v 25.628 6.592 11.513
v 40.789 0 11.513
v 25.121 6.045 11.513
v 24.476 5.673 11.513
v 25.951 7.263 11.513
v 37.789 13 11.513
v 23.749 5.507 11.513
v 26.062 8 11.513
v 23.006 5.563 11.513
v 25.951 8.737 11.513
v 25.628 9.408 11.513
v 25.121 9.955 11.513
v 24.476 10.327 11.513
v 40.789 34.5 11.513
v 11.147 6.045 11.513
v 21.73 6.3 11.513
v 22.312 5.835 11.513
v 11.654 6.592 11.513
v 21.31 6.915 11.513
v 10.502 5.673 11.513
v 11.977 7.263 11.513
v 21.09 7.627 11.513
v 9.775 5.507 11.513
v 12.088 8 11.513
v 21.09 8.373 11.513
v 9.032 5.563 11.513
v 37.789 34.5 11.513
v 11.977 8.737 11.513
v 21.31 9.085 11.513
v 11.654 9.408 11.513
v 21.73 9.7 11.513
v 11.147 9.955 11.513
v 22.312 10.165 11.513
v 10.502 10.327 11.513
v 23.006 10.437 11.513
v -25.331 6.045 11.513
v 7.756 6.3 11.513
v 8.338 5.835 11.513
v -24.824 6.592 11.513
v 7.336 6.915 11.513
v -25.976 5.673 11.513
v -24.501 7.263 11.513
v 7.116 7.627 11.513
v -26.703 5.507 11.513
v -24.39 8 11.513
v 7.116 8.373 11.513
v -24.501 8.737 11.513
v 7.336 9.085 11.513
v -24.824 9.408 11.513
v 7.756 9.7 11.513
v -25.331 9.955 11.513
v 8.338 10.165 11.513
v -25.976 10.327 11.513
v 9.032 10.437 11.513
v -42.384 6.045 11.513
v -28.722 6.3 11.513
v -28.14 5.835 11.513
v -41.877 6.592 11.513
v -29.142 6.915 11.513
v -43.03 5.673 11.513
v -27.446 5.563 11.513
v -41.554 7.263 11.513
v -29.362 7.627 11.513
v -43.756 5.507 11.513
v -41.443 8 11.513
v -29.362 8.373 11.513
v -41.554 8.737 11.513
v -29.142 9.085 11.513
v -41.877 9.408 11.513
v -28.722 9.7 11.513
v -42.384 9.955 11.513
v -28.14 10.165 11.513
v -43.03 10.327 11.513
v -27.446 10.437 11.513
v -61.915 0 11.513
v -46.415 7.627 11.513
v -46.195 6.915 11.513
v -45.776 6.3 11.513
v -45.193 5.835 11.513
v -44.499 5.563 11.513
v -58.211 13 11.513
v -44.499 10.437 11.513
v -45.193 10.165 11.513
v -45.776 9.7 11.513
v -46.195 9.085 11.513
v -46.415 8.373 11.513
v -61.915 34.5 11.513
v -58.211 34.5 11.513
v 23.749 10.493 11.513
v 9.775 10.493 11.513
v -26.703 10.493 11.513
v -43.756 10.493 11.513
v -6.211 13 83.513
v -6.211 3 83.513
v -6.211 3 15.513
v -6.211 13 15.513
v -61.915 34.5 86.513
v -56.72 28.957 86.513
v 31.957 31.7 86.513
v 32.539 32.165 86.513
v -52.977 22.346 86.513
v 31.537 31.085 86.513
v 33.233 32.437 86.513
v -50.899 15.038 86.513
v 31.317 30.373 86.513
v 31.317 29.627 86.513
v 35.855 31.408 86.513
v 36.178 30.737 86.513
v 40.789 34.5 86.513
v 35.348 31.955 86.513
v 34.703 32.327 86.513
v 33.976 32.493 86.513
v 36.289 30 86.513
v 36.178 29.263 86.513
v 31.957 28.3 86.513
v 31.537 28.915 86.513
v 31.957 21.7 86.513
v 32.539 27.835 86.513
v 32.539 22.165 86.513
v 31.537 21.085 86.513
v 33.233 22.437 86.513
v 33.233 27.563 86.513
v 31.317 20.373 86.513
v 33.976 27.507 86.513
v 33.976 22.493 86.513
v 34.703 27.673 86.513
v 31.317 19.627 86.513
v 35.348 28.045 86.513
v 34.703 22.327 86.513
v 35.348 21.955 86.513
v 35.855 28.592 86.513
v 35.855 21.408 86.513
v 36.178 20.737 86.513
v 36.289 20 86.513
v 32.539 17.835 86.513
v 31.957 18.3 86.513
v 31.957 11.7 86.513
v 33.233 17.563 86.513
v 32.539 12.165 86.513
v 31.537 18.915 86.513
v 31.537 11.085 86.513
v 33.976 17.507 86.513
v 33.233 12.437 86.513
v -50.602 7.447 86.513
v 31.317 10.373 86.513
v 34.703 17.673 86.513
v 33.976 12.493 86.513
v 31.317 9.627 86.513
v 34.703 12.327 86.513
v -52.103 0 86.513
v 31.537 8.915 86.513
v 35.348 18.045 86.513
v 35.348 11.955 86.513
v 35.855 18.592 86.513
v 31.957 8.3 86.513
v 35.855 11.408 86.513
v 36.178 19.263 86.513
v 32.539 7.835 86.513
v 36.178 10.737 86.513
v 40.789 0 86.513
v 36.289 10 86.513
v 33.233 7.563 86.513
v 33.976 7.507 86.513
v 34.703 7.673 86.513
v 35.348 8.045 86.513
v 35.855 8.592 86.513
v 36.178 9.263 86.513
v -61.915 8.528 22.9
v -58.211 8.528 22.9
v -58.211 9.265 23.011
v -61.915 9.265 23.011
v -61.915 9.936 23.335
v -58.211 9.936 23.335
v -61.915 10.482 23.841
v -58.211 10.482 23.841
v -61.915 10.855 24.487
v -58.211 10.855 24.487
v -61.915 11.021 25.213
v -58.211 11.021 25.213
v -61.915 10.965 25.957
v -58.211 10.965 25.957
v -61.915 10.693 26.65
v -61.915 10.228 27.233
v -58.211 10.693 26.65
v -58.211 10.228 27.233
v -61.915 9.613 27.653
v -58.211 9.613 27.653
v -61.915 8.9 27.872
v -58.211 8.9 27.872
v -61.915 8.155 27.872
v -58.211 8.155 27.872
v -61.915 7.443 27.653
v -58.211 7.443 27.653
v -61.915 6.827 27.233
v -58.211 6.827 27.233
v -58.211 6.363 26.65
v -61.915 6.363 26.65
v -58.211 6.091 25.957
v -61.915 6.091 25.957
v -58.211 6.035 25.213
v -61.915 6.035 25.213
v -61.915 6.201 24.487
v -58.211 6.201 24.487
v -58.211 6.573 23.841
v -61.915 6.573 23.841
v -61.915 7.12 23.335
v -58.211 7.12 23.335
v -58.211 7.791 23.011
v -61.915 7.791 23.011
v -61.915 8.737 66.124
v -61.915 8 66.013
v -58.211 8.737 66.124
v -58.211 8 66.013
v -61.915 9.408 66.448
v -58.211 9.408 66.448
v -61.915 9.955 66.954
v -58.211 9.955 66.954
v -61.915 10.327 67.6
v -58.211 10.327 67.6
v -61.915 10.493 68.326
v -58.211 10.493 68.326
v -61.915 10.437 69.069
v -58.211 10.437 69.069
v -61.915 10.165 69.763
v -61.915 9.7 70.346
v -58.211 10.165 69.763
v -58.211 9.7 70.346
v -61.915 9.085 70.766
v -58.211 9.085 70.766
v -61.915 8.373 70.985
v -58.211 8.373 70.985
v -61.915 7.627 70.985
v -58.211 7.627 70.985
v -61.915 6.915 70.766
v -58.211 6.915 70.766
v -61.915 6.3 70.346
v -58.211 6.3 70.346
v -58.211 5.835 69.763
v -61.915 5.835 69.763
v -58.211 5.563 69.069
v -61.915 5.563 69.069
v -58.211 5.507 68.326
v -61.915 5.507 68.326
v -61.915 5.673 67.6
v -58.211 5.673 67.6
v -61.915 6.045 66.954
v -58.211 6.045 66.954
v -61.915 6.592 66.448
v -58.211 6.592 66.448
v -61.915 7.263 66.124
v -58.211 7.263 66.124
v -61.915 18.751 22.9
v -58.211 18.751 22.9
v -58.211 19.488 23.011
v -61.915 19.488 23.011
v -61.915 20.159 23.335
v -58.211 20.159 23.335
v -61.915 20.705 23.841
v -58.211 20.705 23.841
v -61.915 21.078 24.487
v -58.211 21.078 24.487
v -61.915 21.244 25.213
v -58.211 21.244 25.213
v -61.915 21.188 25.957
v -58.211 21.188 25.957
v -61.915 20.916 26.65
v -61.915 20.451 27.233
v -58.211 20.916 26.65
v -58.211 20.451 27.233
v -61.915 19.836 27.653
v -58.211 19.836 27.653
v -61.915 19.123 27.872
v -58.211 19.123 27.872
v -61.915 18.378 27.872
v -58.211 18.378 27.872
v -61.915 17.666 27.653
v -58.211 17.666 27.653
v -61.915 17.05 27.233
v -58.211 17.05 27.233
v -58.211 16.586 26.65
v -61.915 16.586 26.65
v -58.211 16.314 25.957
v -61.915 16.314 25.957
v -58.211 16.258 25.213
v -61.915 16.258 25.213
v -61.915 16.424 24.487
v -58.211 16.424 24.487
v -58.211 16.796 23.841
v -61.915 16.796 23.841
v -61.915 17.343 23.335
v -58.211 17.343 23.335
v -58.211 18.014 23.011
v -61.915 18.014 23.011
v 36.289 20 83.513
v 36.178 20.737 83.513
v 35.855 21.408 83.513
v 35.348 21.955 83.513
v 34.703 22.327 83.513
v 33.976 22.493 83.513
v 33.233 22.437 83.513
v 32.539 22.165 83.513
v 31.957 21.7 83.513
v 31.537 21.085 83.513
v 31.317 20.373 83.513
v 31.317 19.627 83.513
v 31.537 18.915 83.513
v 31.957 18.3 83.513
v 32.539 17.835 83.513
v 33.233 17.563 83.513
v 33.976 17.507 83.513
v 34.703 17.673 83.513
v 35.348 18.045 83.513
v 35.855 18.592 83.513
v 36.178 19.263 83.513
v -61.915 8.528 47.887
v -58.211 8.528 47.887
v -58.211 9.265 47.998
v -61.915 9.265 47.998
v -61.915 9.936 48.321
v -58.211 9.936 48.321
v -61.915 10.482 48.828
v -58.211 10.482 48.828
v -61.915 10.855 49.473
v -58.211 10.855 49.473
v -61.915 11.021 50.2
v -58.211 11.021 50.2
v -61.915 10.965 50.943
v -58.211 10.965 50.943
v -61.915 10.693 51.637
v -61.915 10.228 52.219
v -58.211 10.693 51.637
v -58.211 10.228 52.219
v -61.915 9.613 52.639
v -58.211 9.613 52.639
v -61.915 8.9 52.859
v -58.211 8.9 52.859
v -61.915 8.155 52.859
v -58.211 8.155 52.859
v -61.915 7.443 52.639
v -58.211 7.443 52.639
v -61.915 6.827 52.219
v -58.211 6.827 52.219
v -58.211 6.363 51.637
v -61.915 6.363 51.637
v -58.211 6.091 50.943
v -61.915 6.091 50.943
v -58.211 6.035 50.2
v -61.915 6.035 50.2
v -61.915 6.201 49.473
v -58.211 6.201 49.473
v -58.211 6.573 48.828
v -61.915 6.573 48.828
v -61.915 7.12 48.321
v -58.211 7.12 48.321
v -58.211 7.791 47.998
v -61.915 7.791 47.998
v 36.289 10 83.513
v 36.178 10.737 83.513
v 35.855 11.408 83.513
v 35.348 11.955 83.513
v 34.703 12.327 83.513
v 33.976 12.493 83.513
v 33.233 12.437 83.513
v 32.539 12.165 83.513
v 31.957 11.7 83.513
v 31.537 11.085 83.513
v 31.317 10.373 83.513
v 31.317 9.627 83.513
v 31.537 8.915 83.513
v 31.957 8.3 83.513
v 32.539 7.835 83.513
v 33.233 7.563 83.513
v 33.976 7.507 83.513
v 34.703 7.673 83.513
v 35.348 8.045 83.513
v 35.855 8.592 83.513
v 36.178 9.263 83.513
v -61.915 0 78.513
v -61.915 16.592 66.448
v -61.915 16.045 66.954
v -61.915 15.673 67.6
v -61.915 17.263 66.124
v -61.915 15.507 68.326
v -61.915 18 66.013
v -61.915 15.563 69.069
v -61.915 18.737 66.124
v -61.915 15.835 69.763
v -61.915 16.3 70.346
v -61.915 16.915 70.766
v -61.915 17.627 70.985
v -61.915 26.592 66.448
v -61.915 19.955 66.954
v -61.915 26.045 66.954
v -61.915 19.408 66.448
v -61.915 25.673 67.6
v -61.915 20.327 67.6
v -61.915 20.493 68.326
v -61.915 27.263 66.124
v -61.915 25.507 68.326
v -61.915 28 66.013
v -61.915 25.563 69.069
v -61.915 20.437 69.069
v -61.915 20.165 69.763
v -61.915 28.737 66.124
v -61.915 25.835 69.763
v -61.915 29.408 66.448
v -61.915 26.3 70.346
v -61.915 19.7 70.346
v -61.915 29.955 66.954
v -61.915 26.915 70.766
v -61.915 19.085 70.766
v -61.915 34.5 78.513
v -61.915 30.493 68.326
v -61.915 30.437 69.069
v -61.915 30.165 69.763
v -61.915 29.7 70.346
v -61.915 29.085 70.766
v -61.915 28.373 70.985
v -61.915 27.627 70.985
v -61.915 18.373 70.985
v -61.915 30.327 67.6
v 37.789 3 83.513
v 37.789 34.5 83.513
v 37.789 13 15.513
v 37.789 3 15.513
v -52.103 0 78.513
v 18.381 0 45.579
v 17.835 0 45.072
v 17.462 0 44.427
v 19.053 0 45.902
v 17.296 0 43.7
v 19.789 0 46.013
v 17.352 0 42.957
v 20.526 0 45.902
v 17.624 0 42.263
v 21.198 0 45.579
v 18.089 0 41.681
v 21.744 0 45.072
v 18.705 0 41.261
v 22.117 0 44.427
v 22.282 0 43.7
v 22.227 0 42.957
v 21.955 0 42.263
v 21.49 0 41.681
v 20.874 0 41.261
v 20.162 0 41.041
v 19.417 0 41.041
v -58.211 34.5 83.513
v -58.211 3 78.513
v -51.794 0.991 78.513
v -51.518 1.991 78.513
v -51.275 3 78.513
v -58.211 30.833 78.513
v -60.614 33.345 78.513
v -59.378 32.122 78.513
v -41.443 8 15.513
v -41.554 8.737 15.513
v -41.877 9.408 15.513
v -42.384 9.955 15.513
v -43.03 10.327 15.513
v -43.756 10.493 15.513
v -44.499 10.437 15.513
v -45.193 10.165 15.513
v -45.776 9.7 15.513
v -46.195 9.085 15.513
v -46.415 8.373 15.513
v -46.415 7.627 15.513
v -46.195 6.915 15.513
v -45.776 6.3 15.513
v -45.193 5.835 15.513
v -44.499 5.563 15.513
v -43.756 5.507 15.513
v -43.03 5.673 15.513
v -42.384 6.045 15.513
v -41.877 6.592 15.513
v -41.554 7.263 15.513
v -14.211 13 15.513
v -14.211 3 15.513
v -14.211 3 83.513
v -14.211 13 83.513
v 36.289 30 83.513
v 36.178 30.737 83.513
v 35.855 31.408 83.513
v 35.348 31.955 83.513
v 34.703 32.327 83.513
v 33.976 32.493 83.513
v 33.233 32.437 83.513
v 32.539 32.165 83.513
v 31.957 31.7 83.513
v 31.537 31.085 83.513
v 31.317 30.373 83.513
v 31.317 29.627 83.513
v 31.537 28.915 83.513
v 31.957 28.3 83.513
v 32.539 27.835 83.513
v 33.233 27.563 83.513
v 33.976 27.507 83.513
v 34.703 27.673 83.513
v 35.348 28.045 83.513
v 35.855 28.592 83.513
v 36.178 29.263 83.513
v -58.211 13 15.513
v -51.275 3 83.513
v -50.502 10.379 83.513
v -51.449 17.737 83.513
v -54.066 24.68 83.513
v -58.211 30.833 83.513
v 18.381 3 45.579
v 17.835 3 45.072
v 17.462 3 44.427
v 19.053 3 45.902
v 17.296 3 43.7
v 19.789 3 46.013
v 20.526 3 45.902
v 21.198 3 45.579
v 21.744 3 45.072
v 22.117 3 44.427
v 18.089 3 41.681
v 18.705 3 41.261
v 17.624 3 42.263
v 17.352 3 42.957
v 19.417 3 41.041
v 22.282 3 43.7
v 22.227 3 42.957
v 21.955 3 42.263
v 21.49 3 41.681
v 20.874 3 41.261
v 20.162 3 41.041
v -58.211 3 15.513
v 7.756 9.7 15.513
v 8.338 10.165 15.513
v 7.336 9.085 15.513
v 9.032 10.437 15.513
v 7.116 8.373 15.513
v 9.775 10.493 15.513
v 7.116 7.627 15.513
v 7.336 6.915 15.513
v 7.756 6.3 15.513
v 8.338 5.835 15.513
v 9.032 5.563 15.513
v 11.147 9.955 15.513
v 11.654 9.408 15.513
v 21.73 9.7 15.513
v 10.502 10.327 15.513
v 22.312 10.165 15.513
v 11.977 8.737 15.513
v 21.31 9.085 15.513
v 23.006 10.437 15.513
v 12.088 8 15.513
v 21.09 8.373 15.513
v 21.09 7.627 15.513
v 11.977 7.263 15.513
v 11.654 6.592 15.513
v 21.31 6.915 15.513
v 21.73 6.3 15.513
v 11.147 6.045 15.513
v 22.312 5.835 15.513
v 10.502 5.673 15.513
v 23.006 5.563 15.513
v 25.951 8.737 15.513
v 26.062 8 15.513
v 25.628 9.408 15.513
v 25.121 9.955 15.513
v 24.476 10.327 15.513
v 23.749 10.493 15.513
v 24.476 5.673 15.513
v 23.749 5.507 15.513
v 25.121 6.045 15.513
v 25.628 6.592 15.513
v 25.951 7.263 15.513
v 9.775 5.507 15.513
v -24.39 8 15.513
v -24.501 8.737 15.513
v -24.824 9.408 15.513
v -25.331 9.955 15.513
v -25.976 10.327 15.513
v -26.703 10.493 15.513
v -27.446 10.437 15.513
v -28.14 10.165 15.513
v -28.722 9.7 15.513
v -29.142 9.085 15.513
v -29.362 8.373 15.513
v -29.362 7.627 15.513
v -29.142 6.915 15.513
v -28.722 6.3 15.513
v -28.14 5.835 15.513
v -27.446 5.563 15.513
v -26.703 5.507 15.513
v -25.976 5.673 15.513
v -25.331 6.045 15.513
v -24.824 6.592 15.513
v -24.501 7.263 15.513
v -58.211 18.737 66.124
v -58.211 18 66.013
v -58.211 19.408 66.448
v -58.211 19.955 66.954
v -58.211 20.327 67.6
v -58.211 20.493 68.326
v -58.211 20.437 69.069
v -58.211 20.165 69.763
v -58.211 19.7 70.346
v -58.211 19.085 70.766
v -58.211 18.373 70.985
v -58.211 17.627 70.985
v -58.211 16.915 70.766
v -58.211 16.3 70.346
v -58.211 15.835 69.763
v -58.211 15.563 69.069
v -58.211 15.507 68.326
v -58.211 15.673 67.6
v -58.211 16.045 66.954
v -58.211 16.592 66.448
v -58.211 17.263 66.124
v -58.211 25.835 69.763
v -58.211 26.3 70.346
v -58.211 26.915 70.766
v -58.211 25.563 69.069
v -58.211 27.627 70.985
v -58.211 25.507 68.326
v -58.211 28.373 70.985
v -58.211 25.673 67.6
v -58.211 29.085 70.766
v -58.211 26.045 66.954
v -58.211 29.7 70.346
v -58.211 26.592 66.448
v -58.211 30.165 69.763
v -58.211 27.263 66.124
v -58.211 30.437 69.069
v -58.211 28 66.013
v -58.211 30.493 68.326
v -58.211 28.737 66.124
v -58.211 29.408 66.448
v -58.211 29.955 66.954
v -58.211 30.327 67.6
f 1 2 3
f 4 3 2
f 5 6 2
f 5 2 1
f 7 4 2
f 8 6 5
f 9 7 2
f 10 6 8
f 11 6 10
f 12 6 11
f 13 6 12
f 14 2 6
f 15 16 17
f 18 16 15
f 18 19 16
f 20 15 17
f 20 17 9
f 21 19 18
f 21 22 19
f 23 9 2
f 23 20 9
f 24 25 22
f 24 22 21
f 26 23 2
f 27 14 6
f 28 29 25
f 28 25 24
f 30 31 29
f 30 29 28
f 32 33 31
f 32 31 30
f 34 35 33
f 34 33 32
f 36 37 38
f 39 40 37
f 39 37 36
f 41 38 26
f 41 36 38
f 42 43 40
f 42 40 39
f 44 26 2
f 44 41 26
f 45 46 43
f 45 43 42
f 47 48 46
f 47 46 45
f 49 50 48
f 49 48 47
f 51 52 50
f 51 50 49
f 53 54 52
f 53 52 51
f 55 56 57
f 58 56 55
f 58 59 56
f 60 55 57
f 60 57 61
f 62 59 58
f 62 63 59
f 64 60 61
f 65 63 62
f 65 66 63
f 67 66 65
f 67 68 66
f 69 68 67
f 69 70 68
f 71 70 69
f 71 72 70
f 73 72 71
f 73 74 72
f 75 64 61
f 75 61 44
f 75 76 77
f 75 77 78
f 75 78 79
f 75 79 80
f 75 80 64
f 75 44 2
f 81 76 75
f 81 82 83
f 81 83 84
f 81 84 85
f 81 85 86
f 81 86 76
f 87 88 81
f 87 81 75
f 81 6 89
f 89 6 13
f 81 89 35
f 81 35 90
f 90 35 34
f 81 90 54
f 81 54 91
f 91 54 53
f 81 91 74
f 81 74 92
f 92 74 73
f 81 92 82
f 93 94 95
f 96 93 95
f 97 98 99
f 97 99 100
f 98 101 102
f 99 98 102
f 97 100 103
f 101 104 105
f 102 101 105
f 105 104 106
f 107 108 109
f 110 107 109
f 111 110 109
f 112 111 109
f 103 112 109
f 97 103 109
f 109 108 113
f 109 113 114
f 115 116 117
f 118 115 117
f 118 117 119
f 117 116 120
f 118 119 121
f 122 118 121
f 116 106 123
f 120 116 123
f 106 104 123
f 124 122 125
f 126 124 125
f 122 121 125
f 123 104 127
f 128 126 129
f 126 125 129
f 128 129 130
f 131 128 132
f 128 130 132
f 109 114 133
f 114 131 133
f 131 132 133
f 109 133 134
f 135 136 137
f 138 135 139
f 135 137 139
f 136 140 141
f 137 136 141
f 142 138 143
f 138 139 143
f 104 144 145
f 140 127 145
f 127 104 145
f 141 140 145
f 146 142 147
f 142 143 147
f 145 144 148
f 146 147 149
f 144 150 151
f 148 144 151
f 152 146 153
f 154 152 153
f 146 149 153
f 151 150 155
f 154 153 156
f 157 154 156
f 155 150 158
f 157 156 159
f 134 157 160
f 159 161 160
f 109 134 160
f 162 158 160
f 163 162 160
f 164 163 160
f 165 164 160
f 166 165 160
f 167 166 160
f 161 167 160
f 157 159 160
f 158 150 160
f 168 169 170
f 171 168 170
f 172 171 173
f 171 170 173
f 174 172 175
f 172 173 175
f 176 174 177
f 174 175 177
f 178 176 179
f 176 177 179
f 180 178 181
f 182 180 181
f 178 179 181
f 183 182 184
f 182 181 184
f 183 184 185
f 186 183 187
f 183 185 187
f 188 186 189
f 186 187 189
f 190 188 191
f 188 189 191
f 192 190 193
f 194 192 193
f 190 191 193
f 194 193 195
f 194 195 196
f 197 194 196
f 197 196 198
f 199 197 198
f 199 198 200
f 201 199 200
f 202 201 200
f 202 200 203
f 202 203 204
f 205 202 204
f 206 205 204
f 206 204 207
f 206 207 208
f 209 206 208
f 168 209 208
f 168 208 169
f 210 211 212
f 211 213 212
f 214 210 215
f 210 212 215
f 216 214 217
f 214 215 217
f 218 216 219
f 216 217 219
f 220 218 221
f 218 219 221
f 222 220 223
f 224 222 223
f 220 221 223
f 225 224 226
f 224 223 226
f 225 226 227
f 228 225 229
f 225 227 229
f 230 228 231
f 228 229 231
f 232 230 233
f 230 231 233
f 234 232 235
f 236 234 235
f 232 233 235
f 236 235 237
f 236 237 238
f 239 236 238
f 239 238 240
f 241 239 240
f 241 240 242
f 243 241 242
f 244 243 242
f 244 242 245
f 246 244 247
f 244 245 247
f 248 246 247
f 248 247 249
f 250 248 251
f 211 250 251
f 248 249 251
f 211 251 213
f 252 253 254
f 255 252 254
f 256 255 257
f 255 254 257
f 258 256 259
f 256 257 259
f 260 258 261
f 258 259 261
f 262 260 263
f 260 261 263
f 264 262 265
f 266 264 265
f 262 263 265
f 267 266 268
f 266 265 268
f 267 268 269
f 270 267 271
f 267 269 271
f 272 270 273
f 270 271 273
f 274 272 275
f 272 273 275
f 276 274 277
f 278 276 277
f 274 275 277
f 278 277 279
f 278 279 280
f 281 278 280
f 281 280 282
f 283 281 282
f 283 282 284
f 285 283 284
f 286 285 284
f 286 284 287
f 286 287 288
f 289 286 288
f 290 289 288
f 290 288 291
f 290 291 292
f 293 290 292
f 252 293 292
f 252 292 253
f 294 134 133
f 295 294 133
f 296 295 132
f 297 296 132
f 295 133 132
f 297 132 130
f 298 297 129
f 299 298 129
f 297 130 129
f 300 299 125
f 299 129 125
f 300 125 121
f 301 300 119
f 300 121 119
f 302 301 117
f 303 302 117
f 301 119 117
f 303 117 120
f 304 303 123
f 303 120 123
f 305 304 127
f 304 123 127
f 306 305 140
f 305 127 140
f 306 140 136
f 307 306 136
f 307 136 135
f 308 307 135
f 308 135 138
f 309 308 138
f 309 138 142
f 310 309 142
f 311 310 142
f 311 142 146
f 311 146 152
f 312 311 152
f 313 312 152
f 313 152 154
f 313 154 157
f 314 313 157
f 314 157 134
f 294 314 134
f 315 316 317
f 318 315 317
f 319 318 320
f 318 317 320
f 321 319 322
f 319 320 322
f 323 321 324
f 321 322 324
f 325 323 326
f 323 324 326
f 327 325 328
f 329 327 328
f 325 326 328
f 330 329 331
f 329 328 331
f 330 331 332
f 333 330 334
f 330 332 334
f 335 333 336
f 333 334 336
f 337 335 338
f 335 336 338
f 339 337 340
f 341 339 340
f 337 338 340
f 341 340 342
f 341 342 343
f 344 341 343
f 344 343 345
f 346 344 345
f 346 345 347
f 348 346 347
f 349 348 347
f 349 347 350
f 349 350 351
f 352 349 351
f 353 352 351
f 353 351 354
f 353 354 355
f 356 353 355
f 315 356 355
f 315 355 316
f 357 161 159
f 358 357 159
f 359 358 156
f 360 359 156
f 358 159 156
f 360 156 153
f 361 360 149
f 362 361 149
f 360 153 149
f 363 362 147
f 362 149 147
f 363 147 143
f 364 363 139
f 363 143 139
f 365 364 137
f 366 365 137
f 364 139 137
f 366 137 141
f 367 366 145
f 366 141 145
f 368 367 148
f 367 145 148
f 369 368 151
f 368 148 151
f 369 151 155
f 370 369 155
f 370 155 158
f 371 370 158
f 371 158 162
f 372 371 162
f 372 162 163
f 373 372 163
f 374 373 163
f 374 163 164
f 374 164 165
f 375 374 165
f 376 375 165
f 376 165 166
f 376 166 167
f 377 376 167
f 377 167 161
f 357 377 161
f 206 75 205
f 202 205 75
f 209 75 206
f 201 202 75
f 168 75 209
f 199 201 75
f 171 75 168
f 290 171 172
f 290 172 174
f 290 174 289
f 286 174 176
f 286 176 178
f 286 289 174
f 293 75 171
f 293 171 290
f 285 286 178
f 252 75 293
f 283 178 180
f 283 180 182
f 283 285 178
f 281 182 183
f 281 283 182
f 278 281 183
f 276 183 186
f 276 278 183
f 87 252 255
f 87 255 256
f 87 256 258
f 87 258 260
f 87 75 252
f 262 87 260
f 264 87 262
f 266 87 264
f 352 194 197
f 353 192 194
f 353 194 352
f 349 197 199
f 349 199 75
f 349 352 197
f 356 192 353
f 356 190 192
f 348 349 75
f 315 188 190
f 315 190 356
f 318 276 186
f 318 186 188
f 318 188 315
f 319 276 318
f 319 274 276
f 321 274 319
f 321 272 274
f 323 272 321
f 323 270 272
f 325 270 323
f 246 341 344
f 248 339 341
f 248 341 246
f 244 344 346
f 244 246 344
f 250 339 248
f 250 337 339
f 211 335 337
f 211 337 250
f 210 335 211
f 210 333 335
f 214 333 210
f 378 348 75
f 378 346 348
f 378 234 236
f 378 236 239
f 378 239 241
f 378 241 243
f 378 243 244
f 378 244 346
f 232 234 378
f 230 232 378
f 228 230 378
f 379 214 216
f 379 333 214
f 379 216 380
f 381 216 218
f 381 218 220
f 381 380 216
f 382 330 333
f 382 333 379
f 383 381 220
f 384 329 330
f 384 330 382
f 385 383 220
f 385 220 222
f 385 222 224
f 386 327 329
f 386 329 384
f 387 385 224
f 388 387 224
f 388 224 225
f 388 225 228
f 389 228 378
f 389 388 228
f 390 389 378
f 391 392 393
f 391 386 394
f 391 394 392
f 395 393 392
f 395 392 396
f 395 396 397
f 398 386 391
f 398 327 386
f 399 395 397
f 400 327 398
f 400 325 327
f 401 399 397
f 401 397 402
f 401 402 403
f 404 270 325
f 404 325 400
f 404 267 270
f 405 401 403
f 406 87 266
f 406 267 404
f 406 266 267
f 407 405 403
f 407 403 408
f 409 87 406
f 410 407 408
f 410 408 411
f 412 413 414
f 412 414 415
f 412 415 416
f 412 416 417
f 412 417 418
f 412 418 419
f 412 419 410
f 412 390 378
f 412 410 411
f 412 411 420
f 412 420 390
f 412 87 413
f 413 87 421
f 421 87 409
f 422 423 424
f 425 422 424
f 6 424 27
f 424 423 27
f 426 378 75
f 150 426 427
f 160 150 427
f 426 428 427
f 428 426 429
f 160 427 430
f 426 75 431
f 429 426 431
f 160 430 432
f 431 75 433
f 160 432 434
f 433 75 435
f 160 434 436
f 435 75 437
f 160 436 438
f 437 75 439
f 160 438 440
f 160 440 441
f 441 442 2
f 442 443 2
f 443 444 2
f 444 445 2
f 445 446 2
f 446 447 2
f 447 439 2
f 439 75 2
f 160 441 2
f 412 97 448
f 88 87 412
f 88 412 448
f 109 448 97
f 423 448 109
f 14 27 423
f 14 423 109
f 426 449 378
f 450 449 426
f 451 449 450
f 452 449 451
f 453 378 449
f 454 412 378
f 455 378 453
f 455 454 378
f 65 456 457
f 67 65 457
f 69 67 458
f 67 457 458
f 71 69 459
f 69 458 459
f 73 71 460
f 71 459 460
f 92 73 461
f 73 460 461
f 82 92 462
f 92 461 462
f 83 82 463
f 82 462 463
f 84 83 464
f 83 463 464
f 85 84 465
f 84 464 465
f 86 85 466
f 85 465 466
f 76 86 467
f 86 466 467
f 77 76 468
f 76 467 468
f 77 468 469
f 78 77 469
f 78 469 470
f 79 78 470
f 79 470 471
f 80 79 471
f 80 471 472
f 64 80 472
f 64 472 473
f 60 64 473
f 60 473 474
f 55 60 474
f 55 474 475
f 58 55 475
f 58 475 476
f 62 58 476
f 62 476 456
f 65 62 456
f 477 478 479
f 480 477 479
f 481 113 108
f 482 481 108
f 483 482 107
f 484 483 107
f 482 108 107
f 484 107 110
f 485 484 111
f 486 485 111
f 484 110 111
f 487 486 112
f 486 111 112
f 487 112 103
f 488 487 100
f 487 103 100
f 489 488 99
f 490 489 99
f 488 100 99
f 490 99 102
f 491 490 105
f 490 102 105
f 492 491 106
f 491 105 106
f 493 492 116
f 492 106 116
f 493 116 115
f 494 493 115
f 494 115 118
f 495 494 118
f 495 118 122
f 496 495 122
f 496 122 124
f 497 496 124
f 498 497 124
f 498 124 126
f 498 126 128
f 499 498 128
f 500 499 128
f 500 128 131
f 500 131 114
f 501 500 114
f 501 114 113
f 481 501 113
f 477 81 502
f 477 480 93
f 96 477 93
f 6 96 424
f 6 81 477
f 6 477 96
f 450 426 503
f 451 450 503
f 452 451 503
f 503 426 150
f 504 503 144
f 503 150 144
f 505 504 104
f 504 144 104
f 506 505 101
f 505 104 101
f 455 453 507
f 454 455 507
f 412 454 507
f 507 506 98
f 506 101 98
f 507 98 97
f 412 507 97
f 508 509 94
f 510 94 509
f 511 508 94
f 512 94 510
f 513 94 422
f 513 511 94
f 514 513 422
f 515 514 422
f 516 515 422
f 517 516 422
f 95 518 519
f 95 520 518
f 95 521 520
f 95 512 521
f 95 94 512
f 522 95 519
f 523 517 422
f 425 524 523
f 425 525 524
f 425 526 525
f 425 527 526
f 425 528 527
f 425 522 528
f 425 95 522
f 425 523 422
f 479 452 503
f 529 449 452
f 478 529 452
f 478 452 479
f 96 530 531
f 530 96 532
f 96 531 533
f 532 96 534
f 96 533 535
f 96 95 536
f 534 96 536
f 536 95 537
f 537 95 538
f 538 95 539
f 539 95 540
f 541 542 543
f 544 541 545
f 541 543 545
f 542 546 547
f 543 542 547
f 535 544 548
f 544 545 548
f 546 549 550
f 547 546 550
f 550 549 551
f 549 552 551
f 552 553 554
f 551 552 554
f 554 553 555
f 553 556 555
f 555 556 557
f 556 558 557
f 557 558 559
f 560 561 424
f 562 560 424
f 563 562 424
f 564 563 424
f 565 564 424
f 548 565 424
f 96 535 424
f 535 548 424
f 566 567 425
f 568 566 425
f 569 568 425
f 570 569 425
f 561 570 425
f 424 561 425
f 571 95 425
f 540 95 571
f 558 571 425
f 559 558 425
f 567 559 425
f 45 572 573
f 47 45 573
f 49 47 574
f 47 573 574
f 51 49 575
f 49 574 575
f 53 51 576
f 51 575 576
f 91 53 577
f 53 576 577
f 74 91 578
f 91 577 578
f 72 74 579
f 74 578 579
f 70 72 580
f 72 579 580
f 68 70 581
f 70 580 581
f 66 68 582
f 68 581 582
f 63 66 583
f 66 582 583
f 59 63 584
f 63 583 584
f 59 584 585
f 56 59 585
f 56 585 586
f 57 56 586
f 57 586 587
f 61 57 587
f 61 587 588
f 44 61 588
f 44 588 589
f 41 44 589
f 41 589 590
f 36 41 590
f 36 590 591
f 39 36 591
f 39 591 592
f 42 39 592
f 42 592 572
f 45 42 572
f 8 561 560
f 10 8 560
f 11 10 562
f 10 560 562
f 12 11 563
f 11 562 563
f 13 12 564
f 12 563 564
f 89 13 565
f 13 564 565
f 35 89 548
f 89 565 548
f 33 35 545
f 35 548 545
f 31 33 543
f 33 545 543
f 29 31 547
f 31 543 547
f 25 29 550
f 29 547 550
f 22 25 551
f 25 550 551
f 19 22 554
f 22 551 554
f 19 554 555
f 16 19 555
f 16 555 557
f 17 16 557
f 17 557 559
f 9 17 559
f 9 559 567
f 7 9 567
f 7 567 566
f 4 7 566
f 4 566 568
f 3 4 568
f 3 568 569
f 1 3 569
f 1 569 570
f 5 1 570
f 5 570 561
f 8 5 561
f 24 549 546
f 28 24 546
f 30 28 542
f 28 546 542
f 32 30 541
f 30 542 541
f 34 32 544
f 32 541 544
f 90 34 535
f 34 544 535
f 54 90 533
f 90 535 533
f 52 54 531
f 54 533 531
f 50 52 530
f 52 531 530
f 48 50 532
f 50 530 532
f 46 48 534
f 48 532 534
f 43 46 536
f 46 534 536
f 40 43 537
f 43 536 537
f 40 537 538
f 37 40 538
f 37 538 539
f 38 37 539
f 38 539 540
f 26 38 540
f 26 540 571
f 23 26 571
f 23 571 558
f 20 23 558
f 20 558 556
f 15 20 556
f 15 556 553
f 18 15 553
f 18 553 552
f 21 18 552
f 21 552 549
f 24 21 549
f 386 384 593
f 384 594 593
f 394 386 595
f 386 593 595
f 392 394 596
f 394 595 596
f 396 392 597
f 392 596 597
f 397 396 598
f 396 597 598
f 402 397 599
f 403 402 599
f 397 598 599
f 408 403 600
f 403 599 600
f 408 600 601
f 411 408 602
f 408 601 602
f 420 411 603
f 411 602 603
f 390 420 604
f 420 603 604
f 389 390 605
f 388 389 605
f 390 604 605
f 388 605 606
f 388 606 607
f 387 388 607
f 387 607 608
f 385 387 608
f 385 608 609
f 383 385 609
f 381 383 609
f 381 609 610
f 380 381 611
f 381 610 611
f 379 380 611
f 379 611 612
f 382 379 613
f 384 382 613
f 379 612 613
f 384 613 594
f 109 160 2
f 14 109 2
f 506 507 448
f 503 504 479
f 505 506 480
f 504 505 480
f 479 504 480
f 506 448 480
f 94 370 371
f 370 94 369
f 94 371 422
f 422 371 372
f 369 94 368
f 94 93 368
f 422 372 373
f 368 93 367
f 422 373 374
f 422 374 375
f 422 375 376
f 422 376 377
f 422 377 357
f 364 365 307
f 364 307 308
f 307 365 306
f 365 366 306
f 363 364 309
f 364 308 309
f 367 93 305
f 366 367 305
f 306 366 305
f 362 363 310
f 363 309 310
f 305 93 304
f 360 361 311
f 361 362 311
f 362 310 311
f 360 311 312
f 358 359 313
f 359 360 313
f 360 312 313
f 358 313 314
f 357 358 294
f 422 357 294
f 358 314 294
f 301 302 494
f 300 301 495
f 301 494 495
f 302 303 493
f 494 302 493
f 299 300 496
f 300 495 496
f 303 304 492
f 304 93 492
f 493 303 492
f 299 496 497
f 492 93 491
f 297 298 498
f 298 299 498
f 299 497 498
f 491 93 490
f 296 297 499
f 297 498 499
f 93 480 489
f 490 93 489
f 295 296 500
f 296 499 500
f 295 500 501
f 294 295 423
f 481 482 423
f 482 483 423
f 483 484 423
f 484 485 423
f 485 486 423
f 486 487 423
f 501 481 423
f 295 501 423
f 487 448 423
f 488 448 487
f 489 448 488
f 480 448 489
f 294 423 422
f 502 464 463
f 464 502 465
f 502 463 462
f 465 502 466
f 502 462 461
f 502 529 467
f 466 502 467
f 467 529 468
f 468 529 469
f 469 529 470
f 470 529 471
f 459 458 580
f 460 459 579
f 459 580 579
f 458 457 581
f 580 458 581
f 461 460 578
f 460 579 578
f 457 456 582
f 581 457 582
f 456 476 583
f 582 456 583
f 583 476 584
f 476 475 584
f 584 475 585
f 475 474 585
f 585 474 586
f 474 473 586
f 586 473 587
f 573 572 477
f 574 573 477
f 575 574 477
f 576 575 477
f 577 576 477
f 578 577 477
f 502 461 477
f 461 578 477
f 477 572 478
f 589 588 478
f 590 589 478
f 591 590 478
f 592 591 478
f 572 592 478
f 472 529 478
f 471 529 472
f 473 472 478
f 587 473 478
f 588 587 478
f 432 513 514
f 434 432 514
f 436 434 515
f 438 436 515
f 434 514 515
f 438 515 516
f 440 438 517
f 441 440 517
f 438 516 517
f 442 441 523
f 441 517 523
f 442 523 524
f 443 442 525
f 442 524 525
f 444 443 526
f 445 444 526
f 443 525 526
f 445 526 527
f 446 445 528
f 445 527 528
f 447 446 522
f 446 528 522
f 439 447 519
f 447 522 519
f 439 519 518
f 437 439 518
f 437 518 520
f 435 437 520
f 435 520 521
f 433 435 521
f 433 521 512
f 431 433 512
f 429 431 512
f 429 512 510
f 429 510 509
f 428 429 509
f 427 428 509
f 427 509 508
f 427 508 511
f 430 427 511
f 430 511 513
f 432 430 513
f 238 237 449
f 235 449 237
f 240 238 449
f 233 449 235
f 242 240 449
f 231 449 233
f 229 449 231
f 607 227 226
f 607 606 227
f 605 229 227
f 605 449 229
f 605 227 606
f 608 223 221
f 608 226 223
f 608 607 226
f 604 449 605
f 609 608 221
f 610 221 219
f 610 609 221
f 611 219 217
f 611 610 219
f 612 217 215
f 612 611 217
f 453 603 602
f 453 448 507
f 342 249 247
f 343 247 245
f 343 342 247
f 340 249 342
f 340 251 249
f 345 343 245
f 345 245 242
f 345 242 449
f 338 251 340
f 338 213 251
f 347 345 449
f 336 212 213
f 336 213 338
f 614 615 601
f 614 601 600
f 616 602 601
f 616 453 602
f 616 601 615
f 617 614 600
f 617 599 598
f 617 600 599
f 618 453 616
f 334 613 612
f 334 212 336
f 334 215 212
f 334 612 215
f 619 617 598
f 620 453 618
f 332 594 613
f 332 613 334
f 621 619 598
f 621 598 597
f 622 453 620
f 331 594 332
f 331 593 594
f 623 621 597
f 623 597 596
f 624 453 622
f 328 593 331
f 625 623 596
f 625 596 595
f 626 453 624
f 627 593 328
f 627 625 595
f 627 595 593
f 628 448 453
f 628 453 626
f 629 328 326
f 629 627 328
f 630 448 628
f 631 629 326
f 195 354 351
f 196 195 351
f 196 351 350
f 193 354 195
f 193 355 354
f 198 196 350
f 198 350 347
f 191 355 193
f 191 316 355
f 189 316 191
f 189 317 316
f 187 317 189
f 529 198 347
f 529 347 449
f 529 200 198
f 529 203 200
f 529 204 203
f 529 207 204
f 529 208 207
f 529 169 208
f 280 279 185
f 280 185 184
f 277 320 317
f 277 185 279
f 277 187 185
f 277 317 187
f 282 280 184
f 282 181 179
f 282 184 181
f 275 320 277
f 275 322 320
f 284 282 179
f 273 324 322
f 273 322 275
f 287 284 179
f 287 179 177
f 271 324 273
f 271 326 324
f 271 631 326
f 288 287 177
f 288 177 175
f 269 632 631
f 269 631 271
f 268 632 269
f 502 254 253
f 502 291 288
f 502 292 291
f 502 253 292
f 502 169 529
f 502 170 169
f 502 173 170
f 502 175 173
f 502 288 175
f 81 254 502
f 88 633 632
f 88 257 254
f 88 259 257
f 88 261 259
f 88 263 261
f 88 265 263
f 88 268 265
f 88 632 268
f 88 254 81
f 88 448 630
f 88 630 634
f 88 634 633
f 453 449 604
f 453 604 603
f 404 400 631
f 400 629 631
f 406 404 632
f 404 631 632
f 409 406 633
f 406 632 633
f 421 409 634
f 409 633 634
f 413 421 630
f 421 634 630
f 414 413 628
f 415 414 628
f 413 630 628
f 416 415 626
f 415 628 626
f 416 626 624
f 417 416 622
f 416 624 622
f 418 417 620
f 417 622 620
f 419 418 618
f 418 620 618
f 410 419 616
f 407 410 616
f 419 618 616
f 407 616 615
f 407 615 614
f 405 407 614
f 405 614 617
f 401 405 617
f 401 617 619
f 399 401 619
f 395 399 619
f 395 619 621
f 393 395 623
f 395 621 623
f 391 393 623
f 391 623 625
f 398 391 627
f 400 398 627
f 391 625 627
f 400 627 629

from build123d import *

# Parameters (mm, degrees)
CUBE_W                    = 150
CUBE_H                    = 150
BOSS_EXTRU_1_DEPTH        = 34.5
PAVE_W                    = 96
PAVE_H                    = 144
ENL_V_MAT_EXTRU_1_DEPTH   = 31.5
VIS1_R                    = 2.5
ENL_V_MAT_EXTRU_2_DEPTH   = 5
ENL_V_START               = -5
VIS2_R                    = 2.5
ENL_V_MAT_EXTRU_3_DEPTH   = 5
PAVE_PROCHE_MOTEUR_W      = 12.5
PAVE_PROCHE_MOTEUR_H      = 124
ENL_V_MAT_EXTRU_4_DEPTH   = 31.5
PAVE_ROUE_LIBRE_W         = 32.86
PAVE_ROUE_LIBRE_H         = 15.696676457
PAVE_ROUE_LIBRE_H_2       = 18.419496328
ENL_V_MAT_EXTRU_5_DEPTH   = 36
CABLES_W                  = 22.36
CABLES_H                  = 10
ENL_V_MAT_EXTRU_6_DEPTH   = 36
ROUE_EXT_R                = 32
ENL_V_MAT_EXTRU_7_DEPTH   = 8
ROUE_INTER_R              = 16.02
ENL_V_MAT_EXTRU_8_DEPTH   = 69
ENL_V_START_2             = -7.5
ROUE_EXT2_R               = 32
ENL_V_MAT_EXTRU_9_DEPTH   = 7.5
ENL_V_START_3             = -69
ROUE_INTER2_R             = 16.02
ENL_V_MAT_EXTRU_10_DEPTH  = 69
VIS_MOTEUR_POUR_SUPPORT_R = 2.5
ENL_V_MAT_EXTRU_11_DEPTH  = 10
BOSS_EXTRU_2_DEPTH        = 10
ESQUISSE2_R               = 2.5
ENL_V_MAT_EXTRU_12_DEPTH  = 10
ESQUISSE3_W               = 3.439870431
ESQUISSE3_H               = 124
BOSS_EXTRU_3_DEPTH        = 31
ESQUISSE5_W               = 3.439870431
ESQUISSE5_H               = 124
BOSS_EXTRU_4_DEPTH        = 0.5
ESQUISSE6_R               = 2.5
ENL_V_MAT_EXTRU_13_DEPTH  = 10
ESQUISSE7_R               = 2.5
ENL_V_MAT_EXTRU_14_DEPTH  = 10
ESQUISSE8_R               = 2.5
ENL_V_MAT_EXTRU_15_DEPTH  = 10
ENL_V_MAT_EXTRU_17_DEPTH  = 40


with BuildPart() as part:
    # Cube → Boss.-Extru.1 (new body)
    with BuildSketch(Plane(origin=(0, 0, 0), x_dir=(1, 0, 0), z_dir=(0, 1, 0))):
        with Locations((-34.210526316, -11.513157895)):
            Rectangle(CUBE_W, CUBE_H)
    extrude(amount=BOSS_EXTRU_1_DEPTH)

    # Pave → Enlèv. mat.-Extru.1 (cut)
    with BuildSketch(Plane(origin=(0, 34.5, 0), x_dir=(1, 0, 0), z_dir=(0, 1, 0))):
        with Locations((-10.210526316, -11.513157895)):
            Rectangle(PAVE_W, PAVE_H)
    extrude(amount=-ENL_V_MAT_EXTRU_1_DEPTH, mode=Mode.SUBTRACT)

    # Vis1 → Enlèv. mat.-Extru.2 (cut)
    with BuildSketch(Plane.XY.offset(86.513157895)):
        with Locations((33.789473684, 10)):
            Circle(VIS1_R)
        with Locations((33.789473684, 20)):
            Circle(VIS1_R)
        with Locations((33.789473684, 30)):
            Circle(VIS1_R)
    extrude(amount=-ENL_V_MAT_EXTRU_2_DEPTH, mode=Mode.SUBTRACT)

    # Vis2 → Enlèv. mat.-Extru.3 (cut)
    with BuildSketch(Plane(origin=(0, 0, -63.486842105), x_dir=(-1, 0, 0), z_dir=(0, 0, -1)).offset(ENL_V_START)):
        with Locations(Location((-33.789473684, 10, 0), (0, 0, 180))):
            Circle(VIS2_R)
        with Locations(Location((-33.789473684, 20, 0), (0, 0, 180))):
            Circle(VIS2_R)
        with Locations(Location((-33.789473684, 30, 0), (0, 0, 180))):
            Circle(VIS2_R)
    extrude(amount=ENL_V_MAT_EXTRU_3_DEPTH, mode=Mode.SUBTRACT)

    # Pave proche moteur → Enlèv. mat.-Extru.4 (cut)
    with BuildSketch(Plane(origin=(0, 34.5, 0), x_dir=(1, 0, 0), z_dir=(0, 1, 0))):
        with Locations((-67.460526316, -11.513157895)):
            Rectangle(PAVE_PROCHE_MOTEUR_W, PAVE_PROCHE_MOTEUR_H)
    extrude(amount=-ENL_V_MAT_EXTRU_4_DEPTH, mode=Mode.SUBTRACT)

    # Pave Roue libre → Enlèv. mat.-Extru.5 (cut)
    with BuildSketch(Plane(origin=(0, 34.5, 0), x_dir=(1, 0, 0), z_dir=(0, 1, 0))):
        with Locations((-87.980526316, 61.335180334)):
            Rectangle(PAVE_ROUE_LIBRE_W, PAVE_ROUE_LIBRE_H)
        with Locations((-87.980526316, -85.722906059)):
            Rectangle(PAVE_ROUE_LIBRE_W, PAVE_ROUE_LIBRE_H_2)
    extrude(amount=-ENL_V_MAT_EXTRU_5_DEPTH, mode=Mode.SUBTRACT)

    # Cables → Enlèv. mat.-Extru.6 (cut)
    with BuildSketch(Plane(origin=(0, 34.5, 0), x_dir=(1, 0, 0), z_dir=(0, 1, 0))):
        with Locations((-89.710526316, -0.513157895)):
            Rectangle(CABLES_W, CABLES_H)
        with Locations((-89.710526316, -22.513157895)):
            Rectangle(CABLES_W, CABLES_H)
    extrude(amount=-ENL_V_MAT_EXTRU_6_DEPTH, mode=Mode.SUBTRACT)

    # Roue ext → Enlèv. mat.-Extru.7 (cut)
    with BuildSketch(Plane.XY.offset(86.513157895)):
        with Locations((-82.5, 10)):
            Circle(ROUE_EXT_R)
    extrude(amount=-ENL_V_MAT_EXTRU_7_DEPTH, mode=Mode.SUBTRACT)

    # Roue inter → Enlèv. mat.-Extru.8 (cut)
    with BuildSketch(Plane.XY.offset(86.513157895)):
        with Locations((-82.5, 10)):
            Circle(ROUE_INTER_R)
    extrude(amount=-ENL_V_MAT_EXTRU_8_DEPTH, mode=Mode.SUBTRACT)

    # Roue ext2 → Enlèv. mat.-Extru.9 (cut)
    with BuildSketch(Plane(origin=(0, 0, -63.486842105), x_dir=(-1, 0, 0), z_dir=(0, 0, -1)).offset(ENL_V_START_2)):
        with Locations((82.5, 10)):
            Circle(ROUE_EXT2_R)
    extrude(amount=ENL_V_MAT_EXTRU_9_DEPTH, mode=Mode.SUBTRACT)

    # Roue inter2 → Enlèv. mat.-Extru.10 (cut)
    with BuildSketch(Plane(origin=(0, 0, -63.486842105), x_dir=(-1, 0, 0), z_dir=(0, 0, -1)).offset(ENL_V_START_3)):
        with Locations((82.5, 10)):
            Circle(ROUE_INTER2_R)
    extrude(amount=ENL_V_MAT_EXTRU_10_DEPTH, mode=Mode.SUBTRACT)

    # Vis Moteur pour support → Enlèv. mat.-Extru.11 (cut)
    with BuildSketch(Plane(origin=(-58.210526316, 0, 0), x_dir=(0, 0, -1), z_dir=(1, 0, 0))):
        with Locations((-68.513157895, 8)):
            Circle(VIS_MOTEUR_POUR_SUPPORT_R)
        with Locations((-68.513157895, 18)):
            Circle(VIS_MOTEUR_POUR_SUPPORT_R)
        with Locations((-68.513157895, 28)):
            Circle(VIS_MOTEUR_POUR_SUPPORT_R)
        with Locations((45.986842105, 8)):
            Circle(VIS_MOTEUR_POUR_SUPPORT_R)
        with Locations((45.986842105, 18)):
            Circle(VIS_MOTEUR_POUR_SUPPORT_R)
        with Locations((45.986842105, 28)):
            Circle(VIS_MOTEUR_POUR_SUPPORT_R)
    extrude(amount=-ENL_V_MAT_EXTRU_11_DEPTH, mode=Mode.SUBTRACT)

    # Esquisse1 → Boss.-Extru.2 (add)
    with BuildSketch(Plane(origin=(0, 3, 0), x_dir=(1, 0, 0), z_dir=(0, 1, 0))):
        Polygon((-58.210526316, -15.513157895), (-14.210526316, -15.513157895), (-14.210526316, -83.513157895), (-6.210526316, -83.513157895), (-6.210526316, -15.513157895), (37.789473684, -15.513157895), (37.789473684, -7.513157895), (-6.210526316, -7.513157895), (-6.210526316, 60.486842105), (-14.210526316, 60.486842105), (-14.210526316, -7.513157895), (-58.210526316, -7.513157895), align=None)
    extrude(amount=BOSS_EXTRU_2_DEPTH)

    # Esquisse2 → Enlèv. mat.-Extru.12 (cut)
    with BuildSketch(Plane.XY.offset(15.513157895)):
        with Locations((-43.942882256, 8)):
            Circle(ESQUISSE2_R)
        with Locations((-26.88958752, 8)):
            Circle(ESQUISSE2_R)
        with Locations((9.588466595, 8)):
            Circle(ESQUISSE2_R)
        with Locations((23.56238511, 8)):
            Circle(ESQUISSE2_R)
    extrude(amount=-ENL_V_MAT_EXTRU_12_DEPTH, mode=Mode.SUBTRACT)

    # Esquisse3 → Boss.-Extru.3 (add)
    with BuildSketch(Plane(origin=(0, 3, 0), x_dir=(1, 0, 0), z_dir=(0, 1, 0))):
        with Locations((-62.930461532, -11.513157895)):
            Rectangle(ESQUISSE3_W, ESQUISSE3_H)
    extrude(amount=BOSS_EXTRU_3_DEPTH)

    # Esquisse5 → Boss.-Extru.4 (add)
    with BuildSketch(Plane(origin=(0, 34, 0), x_dir=(1, 0, 0), z_dir=(0, 1, 0))):
        with Locations((-62.930461532, -11.513157895)):
            Rectangle(ESQUISSE5_W, ESQUISSE5_H)
    extrude(amount=BOSS_EXTRU_4_DEPTH)

    # Esquisse6 → Enlèv. mat.-Extru.13 (cut)
    with BuildSketch(Plane(origin=(-58.210526316, 0, 0), x_dir=(0, 0, -1), z_dir=(1, 0, 0))):
        with Locations((-68.513157895, 28)):
            Circle(ESQUISSE6_R)
        with Locations((-68.513157895, 18)):
            Circle(ESQUISSE6_R)
        with Locations((-68.513157895, 8)):
            Circle(ESQUISSE6_R)
        with Locations((45.986842105, 28)):
            Circle(ESQUISSE6_R)
        with Locations((45.986842105, 18)):
            Circle(ESQUISSE6_R)
        with Locations((45.986842105, 8)):
            Circle(ESQUISSE6_R)
    extrude(amount=-ENL_V_MAT_EXTRU_13_DEPTH, mode=Mode.SUBTRACT)

    # Esquisse7 → Enlèv. mat.-Extru.14 (cut)
    with BuildSketch(Plane(origin=(-58.210526316, 0, 0), x_dir=(0, 0, -1), z_dir=(1, 0, 0))):
        with Locations((0, 8.527871685)):
            Circle(ESQUISSE7_R)
        with Locations((0, 18.750861141)):
            Circle(ESQUISSE7_R)
        with Locations((-25.400224022, 8.527871685)):
            Circle(ESQUISSE7_R)
        with Locations((-25.400224022, 18.750861141)):
            Circle(ESQUISSE7_R)
        with Locations((-50.386538843, 8.527871685)):
            Circle(ESQUISSE7_R)
        with Locations((23.629525814, 8.527871685)):
            Circle(ESQUISSE7_R)
    extrude(amount=-ENL_V_MAT_EXTRU_14_DEPTH, mode=Mode.SUBTRACT)

    # Esquisse8 → Enlèv. mat.-Extru.15 (cut)
    with BuildSketch(Plane(origin=(0, 3, 0), x_dir=(1, 0, 0), z_dir=(0, 1, 0))):
        with Locations(Location((19.789473684, -43.513157895, 0), (0, 0, 270))):
            Circle(ESQUISSE8_R)
        with Locations(Location((19.789473684, 20.486842105, 0), (0, 0, 270))):
            Circle(ESQUISSE8_R)
    extrude(amount=-ENL_V_MAT_EXTRU_15_DEPTH, mode=Mode.SUBTRACT)

    # Esquisse9 → Enlèv. mat.-Extru.17 (cut)
    with BuildSketch(Plane(origin=(0, 34.5, 0), x_dir=(1, 0, 0), z_dir=(0, 1, 0))):
        Polygon((-61.91481115, -86.513157895), (-109.210526316, -86.513157895), (-109.210526316, 63.486842105), (-61.91481115, 63.486842105), (40.789473684, 63.486842105), (40.789473684, -11.513157895), (-61.91481115, -11.513157895), align=None)
    extrude(amount=-ENL_V_MAT_EXTRU_17_DEPTH, mode=Mode.SUBTRACT)


solid = part.part
